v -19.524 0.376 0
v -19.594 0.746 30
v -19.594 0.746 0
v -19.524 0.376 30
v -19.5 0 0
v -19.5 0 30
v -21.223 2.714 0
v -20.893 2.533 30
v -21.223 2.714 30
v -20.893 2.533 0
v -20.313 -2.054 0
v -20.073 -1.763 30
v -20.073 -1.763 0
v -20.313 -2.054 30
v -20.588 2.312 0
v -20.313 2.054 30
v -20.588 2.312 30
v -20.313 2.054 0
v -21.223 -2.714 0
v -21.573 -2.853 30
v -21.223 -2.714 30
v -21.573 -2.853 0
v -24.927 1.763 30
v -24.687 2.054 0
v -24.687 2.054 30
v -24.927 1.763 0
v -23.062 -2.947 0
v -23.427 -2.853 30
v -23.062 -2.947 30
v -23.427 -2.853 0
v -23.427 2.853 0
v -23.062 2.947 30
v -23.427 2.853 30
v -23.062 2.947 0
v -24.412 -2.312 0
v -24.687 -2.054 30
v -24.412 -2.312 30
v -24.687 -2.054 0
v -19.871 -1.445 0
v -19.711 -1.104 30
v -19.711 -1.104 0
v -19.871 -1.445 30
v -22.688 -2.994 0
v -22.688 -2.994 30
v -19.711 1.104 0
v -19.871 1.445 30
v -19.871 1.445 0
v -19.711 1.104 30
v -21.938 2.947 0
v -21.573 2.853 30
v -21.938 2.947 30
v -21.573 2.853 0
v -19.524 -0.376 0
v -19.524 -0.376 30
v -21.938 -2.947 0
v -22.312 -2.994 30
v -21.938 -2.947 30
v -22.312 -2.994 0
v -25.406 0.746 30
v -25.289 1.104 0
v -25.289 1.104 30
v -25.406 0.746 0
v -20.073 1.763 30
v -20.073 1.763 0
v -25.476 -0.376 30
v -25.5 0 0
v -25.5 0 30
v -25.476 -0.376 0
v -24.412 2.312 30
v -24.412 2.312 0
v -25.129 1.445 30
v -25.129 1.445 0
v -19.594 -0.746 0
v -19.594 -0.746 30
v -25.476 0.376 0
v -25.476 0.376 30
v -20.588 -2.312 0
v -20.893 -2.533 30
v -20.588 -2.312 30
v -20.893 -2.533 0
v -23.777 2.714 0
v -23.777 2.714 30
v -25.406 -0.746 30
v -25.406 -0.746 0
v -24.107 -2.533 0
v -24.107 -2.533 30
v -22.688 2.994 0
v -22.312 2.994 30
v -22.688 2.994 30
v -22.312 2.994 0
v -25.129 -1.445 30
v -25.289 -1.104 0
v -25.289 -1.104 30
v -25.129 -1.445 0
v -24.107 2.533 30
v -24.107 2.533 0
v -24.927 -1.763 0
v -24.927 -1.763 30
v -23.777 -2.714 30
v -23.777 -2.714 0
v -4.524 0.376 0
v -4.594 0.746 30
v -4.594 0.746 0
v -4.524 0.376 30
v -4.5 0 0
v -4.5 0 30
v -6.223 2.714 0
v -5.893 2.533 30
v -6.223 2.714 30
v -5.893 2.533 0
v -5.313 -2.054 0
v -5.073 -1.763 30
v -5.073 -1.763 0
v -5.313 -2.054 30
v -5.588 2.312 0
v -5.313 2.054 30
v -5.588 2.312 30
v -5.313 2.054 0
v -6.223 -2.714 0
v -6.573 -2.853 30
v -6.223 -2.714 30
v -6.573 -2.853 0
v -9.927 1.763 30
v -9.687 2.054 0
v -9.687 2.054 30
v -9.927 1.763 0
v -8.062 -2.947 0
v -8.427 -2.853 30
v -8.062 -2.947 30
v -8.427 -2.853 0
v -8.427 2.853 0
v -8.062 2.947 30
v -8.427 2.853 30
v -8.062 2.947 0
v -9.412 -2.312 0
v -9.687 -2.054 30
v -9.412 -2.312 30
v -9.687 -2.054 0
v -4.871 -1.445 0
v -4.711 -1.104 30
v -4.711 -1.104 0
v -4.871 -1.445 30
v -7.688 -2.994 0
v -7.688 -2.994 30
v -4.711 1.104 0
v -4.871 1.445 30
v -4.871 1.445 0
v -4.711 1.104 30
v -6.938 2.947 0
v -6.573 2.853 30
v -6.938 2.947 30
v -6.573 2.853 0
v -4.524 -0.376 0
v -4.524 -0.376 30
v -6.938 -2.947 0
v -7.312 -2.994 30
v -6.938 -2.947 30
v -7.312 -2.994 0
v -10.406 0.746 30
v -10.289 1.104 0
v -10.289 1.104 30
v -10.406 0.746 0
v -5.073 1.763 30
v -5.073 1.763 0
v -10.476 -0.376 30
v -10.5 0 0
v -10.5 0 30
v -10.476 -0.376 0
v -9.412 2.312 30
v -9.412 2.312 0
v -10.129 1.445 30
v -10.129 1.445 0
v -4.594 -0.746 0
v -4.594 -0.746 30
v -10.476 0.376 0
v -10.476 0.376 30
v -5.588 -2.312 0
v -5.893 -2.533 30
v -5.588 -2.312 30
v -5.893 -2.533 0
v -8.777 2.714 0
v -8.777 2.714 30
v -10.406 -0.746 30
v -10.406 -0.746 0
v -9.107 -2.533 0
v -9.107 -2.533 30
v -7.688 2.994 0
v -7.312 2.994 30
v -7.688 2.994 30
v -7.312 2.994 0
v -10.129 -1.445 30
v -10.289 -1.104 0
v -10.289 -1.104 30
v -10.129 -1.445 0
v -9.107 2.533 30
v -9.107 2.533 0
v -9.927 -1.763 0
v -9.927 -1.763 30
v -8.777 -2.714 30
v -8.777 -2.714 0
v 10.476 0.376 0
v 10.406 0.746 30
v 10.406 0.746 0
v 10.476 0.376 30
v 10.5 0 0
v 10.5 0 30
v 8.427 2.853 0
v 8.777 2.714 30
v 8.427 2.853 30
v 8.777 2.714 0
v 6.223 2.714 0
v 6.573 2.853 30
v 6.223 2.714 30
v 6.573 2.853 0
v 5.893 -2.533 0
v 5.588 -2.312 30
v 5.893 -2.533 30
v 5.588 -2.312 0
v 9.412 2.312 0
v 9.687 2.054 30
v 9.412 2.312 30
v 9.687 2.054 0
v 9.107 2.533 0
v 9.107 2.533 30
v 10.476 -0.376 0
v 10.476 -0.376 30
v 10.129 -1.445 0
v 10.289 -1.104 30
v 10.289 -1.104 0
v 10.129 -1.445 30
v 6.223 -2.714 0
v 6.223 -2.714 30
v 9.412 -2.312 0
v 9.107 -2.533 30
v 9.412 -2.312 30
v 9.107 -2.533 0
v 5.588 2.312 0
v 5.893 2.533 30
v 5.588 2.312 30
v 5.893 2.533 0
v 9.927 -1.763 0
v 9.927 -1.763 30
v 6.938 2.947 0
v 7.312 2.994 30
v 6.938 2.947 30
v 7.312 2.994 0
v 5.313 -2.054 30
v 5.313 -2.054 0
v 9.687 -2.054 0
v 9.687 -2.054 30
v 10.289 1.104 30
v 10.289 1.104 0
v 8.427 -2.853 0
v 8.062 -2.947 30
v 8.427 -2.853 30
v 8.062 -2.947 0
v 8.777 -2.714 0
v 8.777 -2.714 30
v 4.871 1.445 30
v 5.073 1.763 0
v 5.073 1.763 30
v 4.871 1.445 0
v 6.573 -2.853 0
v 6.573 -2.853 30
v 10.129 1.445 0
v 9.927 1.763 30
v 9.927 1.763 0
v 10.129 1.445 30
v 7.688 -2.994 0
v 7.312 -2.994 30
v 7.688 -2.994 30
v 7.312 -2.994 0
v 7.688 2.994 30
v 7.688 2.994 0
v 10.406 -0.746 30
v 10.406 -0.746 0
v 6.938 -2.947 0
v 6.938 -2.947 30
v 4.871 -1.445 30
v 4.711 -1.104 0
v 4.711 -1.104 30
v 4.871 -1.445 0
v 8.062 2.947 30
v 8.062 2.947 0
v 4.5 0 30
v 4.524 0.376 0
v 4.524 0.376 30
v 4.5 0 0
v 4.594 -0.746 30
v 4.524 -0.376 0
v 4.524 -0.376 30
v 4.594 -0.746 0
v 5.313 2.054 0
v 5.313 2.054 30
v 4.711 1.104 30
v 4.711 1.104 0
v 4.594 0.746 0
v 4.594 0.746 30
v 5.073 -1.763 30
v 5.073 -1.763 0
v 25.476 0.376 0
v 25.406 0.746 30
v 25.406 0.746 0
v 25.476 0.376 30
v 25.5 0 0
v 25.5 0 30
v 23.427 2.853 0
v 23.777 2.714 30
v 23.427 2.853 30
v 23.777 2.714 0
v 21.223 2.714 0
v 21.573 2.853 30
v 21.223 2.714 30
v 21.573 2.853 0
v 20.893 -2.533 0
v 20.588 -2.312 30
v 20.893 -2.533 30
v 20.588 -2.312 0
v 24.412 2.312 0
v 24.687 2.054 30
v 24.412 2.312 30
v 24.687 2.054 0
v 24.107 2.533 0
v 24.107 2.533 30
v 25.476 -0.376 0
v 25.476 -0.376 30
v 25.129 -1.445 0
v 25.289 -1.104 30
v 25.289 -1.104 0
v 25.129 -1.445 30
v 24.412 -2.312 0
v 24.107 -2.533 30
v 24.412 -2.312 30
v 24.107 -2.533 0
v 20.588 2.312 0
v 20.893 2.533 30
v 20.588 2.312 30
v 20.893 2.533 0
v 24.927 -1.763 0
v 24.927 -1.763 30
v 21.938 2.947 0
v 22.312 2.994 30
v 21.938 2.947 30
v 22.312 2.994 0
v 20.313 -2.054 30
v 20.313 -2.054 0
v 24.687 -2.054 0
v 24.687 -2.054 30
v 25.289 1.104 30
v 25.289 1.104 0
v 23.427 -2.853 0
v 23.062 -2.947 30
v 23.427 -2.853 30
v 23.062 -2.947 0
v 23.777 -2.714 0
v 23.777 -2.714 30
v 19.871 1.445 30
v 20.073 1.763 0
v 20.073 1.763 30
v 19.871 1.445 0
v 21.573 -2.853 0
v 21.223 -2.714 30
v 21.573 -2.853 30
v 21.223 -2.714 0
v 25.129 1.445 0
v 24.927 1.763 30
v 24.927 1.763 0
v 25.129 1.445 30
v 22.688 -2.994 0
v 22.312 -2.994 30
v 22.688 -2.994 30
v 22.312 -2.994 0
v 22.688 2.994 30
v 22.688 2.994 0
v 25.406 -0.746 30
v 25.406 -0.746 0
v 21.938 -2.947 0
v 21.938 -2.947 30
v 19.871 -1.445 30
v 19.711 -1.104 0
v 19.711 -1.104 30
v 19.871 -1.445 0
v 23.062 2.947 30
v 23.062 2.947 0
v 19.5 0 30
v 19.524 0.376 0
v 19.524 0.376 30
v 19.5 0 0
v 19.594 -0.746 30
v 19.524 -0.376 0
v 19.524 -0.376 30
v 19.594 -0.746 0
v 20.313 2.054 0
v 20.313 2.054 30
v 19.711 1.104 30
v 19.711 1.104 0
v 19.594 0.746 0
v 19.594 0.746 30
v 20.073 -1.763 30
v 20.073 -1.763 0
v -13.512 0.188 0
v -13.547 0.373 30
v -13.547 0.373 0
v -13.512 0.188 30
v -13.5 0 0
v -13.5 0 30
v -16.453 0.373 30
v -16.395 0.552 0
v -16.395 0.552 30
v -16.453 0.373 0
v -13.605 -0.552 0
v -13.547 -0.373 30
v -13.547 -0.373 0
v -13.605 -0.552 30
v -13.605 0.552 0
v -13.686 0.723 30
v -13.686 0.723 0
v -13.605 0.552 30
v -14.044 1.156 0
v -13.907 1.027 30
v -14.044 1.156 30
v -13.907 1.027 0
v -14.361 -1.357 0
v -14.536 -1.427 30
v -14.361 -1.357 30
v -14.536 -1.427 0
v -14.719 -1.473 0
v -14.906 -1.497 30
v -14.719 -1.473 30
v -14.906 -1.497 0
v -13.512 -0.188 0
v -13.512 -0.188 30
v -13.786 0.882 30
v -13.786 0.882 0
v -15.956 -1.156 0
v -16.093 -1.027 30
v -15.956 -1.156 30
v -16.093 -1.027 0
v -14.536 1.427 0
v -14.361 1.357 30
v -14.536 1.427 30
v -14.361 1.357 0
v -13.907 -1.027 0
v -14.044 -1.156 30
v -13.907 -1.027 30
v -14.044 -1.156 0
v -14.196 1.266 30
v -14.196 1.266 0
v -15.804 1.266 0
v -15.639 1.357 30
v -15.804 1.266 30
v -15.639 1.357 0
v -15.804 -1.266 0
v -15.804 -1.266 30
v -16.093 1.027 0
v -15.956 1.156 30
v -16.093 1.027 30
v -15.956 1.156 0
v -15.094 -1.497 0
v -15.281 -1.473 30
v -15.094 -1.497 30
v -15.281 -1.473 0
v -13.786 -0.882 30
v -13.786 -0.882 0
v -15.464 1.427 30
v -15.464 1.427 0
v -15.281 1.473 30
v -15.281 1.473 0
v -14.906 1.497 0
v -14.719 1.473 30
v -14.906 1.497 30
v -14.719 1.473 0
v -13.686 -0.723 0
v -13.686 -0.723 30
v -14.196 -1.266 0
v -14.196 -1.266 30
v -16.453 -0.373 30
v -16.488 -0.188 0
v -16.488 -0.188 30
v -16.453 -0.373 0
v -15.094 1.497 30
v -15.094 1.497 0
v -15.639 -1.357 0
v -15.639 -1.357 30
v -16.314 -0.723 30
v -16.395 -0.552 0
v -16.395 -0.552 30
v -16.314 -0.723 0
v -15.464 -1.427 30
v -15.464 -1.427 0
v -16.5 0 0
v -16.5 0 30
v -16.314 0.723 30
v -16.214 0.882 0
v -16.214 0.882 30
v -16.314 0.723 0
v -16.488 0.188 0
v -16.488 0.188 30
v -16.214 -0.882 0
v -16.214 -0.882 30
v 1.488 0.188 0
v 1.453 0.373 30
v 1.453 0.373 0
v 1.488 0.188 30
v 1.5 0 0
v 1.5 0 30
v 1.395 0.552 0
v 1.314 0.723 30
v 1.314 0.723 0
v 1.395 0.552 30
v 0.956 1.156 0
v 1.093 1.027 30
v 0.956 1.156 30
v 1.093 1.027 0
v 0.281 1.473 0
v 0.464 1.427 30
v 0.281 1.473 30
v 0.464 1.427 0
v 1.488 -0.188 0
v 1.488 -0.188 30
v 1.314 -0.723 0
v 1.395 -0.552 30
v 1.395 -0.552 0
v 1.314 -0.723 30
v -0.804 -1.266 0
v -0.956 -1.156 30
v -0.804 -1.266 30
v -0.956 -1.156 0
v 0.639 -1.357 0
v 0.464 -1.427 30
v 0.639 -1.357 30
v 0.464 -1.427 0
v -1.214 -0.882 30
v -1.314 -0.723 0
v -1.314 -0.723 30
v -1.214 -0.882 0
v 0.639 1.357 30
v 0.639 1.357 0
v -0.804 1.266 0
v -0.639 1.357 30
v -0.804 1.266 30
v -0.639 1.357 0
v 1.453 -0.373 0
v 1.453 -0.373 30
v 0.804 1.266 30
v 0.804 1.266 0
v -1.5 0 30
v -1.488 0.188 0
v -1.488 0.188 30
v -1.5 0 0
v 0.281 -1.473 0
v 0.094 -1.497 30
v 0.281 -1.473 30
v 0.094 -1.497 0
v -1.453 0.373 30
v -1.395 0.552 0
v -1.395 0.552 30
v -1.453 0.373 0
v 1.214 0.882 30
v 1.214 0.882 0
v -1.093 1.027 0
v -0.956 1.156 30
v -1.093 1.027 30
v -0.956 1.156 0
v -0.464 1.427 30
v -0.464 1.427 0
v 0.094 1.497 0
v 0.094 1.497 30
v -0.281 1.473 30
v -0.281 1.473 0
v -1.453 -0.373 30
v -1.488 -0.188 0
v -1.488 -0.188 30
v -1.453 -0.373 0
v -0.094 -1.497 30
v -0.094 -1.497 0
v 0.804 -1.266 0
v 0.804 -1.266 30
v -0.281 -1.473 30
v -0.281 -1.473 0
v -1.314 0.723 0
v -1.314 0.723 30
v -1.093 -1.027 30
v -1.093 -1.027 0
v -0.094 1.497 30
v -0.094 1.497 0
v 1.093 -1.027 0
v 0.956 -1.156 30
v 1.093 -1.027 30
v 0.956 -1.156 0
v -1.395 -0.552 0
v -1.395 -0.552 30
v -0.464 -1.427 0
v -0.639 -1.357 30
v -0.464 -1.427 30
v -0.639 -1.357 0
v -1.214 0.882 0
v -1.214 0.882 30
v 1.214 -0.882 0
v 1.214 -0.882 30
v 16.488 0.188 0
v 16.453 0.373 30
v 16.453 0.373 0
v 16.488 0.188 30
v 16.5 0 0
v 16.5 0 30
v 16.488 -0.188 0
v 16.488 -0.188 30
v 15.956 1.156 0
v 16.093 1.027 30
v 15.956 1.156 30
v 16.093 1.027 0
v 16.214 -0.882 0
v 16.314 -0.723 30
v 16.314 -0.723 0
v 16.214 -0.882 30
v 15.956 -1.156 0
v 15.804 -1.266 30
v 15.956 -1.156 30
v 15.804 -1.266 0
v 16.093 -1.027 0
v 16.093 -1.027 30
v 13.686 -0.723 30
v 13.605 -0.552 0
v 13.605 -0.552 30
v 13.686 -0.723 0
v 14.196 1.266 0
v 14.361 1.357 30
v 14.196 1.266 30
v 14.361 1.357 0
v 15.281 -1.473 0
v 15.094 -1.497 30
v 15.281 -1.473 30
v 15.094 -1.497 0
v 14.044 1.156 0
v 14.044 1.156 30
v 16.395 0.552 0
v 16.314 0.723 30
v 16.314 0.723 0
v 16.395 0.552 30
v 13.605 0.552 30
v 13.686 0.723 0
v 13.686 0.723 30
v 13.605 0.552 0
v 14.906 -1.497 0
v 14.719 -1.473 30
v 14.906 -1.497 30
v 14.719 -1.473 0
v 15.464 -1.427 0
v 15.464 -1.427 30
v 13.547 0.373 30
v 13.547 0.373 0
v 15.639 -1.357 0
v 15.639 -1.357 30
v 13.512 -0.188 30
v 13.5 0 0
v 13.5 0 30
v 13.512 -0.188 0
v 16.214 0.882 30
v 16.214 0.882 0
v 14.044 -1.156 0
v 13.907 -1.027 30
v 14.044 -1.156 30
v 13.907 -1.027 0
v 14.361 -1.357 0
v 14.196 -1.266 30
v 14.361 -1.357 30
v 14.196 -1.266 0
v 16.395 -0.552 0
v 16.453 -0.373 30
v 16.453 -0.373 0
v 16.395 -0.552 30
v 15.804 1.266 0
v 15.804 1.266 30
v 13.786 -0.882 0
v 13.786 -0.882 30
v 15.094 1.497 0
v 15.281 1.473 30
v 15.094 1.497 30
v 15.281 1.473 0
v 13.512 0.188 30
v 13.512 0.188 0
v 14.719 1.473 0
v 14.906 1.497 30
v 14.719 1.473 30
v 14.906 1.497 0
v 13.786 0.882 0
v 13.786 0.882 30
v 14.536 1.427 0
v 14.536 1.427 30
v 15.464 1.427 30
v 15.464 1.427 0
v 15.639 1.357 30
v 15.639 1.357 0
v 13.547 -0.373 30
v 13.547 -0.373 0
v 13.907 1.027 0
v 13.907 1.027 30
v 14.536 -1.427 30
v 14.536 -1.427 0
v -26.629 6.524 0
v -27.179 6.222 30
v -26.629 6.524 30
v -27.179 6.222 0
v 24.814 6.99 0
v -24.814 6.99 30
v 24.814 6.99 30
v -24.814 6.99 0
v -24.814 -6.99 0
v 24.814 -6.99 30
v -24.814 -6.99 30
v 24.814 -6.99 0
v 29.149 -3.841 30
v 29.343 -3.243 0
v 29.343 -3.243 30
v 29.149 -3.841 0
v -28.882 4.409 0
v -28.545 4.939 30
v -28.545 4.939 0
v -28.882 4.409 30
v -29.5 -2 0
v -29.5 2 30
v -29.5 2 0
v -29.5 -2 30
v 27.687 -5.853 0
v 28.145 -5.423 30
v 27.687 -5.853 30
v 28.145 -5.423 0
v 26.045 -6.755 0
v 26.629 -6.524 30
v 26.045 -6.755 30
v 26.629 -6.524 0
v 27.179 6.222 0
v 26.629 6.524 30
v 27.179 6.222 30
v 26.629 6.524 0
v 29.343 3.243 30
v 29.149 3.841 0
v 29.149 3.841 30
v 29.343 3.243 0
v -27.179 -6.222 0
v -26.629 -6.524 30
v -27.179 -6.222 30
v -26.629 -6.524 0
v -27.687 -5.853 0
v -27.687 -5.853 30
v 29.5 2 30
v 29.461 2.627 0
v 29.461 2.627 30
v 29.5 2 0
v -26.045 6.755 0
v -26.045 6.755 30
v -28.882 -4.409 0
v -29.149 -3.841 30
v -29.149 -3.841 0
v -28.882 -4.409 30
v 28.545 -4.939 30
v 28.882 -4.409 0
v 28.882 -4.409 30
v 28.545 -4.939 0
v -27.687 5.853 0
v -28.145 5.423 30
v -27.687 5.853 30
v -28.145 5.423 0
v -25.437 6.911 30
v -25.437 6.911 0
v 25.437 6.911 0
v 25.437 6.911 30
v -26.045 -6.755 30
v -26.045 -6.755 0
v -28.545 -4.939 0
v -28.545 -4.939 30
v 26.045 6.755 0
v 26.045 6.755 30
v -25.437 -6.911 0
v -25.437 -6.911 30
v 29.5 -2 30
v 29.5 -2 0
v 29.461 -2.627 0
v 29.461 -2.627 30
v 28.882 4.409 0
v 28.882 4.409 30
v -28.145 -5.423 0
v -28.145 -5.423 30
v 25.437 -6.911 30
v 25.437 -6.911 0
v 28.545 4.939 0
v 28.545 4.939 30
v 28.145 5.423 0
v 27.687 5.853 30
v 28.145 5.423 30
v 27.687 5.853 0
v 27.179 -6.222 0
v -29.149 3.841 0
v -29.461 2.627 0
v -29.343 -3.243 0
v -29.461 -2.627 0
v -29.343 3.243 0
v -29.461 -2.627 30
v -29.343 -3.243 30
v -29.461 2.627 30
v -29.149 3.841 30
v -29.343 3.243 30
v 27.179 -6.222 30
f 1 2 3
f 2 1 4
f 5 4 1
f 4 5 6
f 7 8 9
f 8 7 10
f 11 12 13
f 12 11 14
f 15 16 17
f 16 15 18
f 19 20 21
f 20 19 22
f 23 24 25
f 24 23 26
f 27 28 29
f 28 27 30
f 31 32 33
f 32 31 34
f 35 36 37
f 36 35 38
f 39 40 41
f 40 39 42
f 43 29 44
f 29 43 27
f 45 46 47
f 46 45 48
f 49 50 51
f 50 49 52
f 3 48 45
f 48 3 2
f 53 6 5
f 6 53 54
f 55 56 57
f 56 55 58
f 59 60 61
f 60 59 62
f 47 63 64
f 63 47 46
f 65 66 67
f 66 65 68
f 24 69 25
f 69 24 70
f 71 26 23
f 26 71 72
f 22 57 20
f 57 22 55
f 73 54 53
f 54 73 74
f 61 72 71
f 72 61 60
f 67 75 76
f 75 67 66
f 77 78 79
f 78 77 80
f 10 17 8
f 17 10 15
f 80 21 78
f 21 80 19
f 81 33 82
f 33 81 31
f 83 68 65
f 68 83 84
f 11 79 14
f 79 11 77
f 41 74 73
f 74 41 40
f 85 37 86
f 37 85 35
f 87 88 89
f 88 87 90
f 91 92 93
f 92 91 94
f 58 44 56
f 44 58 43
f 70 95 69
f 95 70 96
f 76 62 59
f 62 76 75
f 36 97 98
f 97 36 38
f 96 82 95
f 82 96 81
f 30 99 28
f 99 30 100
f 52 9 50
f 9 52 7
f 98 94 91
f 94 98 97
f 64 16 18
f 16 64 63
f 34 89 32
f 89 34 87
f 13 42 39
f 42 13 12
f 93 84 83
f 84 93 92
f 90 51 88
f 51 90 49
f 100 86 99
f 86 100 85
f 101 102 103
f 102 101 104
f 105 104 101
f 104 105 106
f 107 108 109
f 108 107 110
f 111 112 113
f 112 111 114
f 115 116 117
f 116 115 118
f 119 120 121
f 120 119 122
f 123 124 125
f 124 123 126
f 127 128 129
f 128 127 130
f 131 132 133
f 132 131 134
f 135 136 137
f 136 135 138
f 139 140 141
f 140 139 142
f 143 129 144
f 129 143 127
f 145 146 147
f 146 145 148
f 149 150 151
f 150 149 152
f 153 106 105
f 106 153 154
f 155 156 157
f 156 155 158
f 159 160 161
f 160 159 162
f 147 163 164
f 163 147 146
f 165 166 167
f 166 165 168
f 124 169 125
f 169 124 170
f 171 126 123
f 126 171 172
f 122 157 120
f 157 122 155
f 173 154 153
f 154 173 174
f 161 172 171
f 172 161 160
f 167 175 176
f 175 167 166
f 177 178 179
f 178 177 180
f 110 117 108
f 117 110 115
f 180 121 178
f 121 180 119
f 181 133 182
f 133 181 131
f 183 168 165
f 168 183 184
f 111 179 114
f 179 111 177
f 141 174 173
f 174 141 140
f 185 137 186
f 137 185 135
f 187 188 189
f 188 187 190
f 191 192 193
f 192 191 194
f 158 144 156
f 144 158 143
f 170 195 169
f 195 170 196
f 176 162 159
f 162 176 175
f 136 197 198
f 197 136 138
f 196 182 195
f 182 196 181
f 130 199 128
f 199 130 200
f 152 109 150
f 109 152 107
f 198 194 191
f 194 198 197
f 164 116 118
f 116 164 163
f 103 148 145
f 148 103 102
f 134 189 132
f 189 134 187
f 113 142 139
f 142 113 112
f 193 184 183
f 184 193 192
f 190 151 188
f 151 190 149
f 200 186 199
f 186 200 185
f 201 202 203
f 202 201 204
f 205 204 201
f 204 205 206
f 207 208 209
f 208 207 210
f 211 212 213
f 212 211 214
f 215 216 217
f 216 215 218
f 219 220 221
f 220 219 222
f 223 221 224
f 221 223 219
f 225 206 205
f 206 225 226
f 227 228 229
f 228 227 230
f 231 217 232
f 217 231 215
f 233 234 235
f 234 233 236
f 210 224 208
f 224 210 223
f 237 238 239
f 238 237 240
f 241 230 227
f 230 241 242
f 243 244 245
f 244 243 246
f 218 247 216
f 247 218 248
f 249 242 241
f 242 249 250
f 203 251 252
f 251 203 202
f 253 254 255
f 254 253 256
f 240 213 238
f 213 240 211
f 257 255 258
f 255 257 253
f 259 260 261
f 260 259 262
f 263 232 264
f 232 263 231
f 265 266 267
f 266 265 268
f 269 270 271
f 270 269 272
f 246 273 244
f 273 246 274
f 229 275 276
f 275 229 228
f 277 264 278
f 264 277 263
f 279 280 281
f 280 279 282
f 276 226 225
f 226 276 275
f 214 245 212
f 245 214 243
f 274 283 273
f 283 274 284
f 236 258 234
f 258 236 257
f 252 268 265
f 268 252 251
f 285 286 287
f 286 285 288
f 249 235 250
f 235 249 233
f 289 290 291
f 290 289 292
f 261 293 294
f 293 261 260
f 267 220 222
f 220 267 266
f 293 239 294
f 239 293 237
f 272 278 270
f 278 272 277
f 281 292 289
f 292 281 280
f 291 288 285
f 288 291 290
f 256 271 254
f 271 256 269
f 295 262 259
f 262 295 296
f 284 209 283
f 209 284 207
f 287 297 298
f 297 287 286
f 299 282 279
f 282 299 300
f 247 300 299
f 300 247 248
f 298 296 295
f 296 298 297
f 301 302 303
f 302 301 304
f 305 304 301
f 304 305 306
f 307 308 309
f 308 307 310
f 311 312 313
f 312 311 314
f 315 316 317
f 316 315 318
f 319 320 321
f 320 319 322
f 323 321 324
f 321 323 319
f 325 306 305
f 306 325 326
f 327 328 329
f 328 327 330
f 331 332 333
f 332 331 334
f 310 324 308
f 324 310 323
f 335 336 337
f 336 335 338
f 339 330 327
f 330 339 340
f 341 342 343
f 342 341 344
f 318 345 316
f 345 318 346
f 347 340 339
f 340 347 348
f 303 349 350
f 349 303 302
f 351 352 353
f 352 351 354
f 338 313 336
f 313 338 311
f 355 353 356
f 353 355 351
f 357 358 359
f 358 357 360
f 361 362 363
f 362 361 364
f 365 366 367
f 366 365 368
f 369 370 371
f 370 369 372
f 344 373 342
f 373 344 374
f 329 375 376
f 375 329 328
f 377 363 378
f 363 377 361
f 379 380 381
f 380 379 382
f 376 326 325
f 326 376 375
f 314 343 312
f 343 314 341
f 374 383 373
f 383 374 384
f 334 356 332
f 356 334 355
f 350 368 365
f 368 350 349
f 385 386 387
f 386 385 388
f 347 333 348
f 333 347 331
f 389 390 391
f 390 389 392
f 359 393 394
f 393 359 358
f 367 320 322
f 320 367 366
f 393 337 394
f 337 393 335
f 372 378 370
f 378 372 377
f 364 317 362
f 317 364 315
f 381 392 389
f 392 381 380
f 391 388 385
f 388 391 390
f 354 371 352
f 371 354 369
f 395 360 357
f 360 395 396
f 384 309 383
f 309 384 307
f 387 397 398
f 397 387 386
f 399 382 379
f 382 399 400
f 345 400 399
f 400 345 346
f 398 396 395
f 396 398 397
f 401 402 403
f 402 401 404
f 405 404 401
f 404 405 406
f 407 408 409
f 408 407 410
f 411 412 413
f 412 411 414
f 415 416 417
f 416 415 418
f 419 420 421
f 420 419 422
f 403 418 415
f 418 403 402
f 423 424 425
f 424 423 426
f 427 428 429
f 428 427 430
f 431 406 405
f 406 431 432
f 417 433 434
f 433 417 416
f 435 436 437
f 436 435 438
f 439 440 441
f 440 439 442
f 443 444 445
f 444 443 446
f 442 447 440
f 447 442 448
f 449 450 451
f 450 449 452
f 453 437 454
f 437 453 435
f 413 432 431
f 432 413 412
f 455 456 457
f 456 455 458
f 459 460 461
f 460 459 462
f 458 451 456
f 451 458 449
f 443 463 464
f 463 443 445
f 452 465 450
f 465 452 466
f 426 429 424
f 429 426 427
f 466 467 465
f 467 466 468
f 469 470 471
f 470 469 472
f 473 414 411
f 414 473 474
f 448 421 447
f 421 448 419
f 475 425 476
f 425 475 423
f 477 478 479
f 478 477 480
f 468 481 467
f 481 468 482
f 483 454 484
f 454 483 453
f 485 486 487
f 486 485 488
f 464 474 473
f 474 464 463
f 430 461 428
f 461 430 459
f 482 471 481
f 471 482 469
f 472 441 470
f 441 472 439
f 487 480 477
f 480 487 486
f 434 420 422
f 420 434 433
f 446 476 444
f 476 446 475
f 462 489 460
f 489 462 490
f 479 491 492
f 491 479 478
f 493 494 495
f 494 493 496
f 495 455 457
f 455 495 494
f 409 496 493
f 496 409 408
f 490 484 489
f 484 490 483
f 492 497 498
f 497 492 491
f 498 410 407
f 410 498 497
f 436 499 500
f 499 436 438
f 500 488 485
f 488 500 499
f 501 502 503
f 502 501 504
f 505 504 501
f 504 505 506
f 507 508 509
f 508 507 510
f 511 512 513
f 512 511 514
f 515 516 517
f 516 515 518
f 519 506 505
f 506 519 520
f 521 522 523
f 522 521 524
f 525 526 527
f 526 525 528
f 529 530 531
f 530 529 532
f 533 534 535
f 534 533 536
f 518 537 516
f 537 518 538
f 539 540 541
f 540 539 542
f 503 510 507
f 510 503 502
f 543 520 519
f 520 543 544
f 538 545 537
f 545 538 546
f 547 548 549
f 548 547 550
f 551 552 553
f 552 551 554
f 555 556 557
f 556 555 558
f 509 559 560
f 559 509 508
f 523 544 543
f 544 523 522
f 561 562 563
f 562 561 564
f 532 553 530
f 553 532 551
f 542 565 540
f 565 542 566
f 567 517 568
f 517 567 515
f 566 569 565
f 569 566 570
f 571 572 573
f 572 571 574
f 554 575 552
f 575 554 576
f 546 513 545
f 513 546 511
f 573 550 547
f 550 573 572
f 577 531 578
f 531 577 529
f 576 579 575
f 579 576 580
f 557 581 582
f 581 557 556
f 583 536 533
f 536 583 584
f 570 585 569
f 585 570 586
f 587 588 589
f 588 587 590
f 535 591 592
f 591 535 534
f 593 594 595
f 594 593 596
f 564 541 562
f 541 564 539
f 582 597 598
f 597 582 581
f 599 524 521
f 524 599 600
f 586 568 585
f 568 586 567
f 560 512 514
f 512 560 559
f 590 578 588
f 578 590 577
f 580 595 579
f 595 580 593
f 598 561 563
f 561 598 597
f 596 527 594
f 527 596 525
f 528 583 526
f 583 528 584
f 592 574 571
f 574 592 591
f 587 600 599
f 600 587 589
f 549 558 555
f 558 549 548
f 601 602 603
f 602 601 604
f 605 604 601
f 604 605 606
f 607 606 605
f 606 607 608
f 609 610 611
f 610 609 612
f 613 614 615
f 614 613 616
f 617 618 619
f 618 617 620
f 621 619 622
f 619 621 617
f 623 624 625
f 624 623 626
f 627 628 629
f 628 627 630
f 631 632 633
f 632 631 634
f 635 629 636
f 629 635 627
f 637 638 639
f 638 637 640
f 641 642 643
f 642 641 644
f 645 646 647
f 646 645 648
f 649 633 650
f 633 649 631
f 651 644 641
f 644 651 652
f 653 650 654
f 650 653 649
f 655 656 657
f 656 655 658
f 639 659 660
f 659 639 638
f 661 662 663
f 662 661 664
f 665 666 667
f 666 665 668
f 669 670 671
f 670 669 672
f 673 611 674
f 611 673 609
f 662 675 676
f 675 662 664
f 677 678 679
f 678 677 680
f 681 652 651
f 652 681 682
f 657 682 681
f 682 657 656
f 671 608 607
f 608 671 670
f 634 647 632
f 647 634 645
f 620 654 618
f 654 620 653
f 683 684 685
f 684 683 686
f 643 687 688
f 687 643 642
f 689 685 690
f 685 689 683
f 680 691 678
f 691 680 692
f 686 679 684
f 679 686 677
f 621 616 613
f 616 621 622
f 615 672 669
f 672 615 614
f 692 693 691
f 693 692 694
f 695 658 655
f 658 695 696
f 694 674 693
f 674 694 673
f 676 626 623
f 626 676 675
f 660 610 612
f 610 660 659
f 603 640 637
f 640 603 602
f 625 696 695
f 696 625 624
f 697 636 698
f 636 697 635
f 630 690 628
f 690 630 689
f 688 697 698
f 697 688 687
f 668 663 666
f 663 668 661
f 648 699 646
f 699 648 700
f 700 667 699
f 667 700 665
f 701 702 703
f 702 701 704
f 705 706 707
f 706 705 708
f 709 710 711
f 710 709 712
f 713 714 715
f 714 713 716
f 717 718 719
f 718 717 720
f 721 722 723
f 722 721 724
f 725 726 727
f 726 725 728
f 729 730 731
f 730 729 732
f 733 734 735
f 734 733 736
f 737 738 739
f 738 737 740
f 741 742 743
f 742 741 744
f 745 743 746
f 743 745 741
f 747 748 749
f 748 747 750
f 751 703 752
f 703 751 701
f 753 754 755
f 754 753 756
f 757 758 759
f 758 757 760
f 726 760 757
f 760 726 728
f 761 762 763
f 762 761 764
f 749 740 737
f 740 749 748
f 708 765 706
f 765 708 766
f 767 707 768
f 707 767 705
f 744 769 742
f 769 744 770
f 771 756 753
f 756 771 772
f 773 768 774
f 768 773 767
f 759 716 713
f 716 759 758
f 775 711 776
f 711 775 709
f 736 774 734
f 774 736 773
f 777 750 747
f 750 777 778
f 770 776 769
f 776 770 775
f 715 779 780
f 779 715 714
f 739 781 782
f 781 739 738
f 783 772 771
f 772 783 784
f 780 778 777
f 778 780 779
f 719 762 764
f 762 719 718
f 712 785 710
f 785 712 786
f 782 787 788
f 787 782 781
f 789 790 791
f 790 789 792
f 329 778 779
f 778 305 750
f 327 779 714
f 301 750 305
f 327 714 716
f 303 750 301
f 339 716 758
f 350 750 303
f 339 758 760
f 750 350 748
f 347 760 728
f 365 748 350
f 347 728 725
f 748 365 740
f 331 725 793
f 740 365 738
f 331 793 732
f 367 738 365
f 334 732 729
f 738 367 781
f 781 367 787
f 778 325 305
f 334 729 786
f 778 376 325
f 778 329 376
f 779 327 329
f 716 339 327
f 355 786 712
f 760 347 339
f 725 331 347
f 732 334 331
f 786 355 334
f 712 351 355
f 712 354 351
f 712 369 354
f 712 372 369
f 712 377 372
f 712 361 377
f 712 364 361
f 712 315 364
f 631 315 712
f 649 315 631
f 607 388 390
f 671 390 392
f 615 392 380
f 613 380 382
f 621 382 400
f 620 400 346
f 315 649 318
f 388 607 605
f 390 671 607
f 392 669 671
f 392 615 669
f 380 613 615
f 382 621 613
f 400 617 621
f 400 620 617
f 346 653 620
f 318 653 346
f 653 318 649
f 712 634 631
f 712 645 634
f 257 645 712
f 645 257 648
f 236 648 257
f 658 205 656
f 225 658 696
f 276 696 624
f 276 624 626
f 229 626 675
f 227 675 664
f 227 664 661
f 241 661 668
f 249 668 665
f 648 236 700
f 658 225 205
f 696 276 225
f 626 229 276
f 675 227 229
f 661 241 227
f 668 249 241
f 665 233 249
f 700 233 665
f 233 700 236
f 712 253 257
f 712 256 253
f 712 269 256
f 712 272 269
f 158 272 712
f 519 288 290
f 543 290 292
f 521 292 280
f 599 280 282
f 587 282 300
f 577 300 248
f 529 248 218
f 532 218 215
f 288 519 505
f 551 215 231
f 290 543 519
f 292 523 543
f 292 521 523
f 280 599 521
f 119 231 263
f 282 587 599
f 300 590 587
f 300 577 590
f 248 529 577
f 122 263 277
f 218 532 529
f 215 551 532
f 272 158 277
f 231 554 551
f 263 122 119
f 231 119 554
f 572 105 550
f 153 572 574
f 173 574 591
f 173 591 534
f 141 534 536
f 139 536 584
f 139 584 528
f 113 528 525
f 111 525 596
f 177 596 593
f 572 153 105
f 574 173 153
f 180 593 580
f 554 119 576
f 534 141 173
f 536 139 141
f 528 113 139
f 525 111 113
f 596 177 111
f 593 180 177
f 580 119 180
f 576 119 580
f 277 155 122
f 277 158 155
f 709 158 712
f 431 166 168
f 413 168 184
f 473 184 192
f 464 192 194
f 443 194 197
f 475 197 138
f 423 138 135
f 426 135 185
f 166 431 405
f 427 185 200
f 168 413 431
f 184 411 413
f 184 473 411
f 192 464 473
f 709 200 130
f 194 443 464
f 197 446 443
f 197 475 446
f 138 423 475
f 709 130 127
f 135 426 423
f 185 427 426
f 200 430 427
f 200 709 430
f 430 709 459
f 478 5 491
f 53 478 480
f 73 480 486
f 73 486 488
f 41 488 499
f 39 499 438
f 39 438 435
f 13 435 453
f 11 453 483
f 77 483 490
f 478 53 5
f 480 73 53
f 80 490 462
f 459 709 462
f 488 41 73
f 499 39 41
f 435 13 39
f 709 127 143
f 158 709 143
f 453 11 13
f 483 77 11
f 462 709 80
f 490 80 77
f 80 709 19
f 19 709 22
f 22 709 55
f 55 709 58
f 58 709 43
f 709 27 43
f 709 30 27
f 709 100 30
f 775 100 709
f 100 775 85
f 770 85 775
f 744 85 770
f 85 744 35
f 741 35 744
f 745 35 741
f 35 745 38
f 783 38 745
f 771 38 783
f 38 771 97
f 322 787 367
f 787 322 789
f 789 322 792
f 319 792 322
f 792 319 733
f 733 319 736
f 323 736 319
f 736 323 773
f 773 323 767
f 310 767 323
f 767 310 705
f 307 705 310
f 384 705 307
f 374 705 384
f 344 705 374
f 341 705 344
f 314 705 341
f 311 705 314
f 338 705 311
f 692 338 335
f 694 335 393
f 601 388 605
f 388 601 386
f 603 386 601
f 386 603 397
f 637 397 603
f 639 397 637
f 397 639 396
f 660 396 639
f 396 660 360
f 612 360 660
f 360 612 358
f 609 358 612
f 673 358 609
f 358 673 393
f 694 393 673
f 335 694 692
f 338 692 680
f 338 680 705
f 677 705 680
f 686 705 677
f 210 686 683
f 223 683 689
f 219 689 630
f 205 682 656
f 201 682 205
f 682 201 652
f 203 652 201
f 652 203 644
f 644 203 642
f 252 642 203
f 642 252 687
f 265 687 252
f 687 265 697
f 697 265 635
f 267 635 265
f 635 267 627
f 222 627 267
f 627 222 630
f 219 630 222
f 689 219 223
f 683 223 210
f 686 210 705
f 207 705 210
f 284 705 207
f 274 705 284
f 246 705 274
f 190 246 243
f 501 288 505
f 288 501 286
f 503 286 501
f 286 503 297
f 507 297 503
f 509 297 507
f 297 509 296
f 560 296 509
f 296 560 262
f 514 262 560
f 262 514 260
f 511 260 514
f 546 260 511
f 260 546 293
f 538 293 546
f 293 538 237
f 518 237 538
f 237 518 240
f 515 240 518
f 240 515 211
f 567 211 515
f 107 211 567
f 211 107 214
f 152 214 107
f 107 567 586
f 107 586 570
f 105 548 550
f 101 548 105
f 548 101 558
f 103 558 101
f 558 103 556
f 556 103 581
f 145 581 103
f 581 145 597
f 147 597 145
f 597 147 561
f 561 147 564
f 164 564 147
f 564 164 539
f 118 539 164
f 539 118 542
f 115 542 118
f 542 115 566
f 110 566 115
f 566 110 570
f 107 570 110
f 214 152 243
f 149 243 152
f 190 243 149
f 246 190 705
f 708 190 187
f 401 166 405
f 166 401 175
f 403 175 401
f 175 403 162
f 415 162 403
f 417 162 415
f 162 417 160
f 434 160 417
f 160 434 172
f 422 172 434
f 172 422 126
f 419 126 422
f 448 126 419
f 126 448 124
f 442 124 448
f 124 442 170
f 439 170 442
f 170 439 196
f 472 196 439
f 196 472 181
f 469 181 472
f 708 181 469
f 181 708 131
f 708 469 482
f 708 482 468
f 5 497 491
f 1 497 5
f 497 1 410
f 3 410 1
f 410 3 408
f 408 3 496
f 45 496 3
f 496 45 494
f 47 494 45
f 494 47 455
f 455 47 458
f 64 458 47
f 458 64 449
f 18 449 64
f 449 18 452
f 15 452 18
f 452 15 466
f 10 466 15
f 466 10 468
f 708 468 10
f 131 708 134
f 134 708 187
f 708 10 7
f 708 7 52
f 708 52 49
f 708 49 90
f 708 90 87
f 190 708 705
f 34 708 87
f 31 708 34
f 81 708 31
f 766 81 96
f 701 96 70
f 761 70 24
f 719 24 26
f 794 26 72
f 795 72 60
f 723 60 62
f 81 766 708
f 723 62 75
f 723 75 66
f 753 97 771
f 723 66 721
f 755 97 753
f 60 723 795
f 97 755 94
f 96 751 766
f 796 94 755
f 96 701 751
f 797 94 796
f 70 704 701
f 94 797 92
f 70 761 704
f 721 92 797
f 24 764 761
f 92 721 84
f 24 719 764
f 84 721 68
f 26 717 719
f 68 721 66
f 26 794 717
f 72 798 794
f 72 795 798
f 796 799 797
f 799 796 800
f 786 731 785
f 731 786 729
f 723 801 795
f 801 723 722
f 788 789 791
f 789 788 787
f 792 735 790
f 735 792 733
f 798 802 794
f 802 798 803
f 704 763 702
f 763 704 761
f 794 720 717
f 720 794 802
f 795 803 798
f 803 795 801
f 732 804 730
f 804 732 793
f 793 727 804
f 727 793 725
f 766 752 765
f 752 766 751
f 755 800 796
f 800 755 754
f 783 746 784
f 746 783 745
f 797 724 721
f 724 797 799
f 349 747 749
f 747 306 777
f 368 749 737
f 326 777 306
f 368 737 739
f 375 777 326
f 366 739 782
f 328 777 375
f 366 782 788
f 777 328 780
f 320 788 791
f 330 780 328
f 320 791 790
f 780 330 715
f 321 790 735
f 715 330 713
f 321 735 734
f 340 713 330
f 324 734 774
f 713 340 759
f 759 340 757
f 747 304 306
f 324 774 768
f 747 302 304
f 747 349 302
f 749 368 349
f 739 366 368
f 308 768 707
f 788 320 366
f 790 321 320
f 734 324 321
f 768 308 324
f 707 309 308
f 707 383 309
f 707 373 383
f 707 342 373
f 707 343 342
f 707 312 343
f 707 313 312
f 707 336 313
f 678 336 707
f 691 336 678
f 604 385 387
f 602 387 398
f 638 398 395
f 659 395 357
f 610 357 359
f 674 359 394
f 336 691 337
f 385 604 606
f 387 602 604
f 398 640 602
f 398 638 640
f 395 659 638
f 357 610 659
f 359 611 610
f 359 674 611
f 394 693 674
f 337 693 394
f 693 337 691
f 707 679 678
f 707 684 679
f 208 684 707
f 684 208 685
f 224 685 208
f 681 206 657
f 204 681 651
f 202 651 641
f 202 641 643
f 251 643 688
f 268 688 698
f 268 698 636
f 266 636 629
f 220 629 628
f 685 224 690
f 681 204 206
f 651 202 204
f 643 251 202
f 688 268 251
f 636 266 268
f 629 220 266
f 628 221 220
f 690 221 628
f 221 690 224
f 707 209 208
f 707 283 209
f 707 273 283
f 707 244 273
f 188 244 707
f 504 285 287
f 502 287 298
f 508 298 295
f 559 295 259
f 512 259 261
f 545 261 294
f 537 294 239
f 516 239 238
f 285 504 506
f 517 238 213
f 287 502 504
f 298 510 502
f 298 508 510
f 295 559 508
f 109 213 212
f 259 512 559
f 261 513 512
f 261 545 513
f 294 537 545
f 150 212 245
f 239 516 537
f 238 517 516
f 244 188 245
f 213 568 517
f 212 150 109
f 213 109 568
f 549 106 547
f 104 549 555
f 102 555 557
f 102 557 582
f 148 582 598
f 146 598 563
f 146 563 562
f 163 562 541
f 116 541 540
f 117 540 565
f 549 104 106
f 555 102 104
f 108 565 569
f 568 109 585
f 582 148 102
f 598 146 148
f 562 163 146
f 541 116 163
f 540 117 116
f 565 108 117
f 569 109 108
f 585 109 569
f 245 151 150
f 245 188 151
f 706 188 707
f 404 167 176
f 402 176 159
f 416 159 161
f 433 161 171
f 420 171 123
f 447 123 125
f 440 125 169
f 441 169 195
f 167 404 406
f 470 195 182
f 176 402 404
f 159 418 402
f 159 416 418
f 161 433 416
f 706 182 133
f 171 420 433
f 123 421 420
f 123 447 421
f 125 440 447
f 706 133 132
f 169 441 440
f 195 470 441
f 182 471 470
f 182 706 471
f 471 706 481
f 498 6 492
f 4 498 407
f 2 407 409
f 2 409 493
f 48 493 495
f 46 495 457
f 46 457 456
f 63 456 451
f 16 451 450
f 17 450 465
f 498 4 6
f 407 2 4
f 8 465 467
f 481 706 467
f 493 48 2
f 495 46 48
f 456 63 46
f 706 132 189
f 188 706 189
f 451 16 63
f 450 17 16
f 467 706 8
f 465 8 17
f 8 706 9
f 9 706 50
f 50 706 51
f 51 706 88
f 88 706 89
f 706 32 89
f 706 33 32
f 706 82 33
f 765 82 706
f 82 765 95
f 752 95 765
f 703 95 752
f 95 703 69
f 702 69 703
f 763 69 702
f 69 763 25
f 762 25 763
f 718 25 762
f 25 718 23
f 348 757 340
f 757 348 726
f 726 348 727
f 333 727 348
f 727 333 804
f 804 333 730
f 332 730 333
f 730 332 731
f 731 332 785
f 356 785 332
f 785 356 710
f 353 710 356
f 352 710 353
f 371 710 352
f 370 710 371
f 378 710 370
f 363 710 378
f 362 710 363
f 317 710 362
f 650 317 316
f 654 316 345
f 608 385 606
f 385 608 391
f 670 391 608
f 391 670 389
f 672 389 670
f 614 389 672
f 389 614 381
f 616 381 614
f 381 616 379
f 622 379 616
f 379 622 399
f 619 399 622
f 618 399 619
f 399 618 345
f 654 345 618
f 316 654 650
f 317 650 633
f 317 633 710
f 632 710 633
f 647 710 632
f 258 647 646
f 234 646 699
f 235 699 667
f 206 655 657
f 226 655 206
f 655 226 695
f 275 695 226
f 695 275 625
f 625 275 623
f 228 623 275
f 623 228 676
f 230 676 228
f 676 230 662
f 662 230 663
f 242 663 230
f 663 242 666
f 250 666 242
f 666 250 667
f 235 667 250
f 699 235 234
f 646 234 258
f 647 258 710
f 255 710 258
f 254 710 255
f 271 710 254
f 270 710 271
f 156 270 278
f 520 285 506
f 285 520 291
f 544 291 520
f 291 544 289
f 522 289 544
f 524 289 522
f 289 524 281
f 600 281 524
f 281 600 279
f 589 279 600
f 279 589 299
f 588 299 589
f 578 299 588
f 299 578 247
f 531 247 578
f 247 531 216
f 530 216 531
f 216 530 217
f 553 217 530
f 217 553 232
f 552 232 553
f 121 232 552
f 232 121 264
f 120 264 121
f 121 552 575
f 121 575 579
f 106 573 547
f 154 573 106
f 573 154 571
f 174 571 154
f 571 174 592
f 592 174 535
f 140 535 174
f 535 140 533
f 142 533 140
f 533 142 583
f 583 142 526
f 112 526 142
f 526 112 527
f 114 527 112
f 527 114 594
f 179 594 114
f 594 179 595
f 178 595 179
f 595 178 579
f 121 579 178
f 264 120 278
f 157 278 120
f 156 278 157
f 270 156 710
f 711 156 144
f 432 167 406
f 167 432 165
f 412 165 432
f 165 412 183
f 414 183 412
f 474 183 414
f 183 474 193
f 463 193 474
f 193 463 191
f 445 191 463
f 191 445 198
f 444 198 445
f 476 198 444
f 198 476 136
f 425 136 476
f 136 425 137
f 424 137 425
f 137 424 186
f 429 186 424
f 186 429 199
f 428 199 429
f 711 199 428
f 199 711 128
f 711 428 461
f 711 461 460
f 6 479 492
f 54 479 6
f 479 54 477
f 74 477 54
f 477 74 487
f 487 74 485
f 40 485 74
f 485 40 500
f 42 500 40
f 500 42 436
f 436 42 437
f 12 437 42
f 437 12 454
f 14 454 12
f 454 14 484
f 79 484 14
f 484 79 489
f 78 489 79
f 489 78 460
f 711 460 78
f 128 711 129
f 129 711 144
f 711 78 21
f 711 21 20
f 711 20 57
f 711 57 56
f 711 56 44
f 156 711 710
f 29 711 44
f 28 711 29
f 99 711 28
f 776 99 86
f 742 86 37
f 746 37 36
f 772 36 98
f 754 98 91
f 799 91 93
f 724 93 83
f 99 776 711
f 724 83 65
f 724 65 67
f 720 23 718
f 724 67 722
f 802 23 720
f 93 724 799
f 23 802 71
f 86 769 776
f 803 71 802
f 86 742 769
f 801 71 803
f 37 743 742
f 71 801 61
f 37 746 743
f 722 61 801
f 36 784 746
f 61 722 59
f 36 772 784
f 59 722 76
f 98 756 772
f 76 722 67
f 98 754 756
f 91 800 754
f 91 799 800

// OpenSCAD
$fn = 50;


difference() {
	union() {
		hull() {
			translate(v = [-24.5000000000, 2.0000000000, 0]) {
				cylinder(h = 30, r = 5);
			}
			translate(v = [24.5000000000, 2.0000000000, 0]) {
				cylinder(h = 30, r = 5);
			}
			translate(v = [-24.5000000000, -2.0000000000, 0]) {
				cylinder(h = 30, r = 5);
			}
			translate(v = [24.5000000000, -2.0000000000, 0]) {
				cylinder(h = 30, r = 5);
			}
		}
	}
	union() {
		translate(v = [-22.5000000000, 0.0000000000, 0]) {
			translate(v = [0, 0, -100]) {
				cylinder(h = 200, r = 3.0000000000);
			}
		}
		translate(v = [-7.5000000000, 0.0000000000, 0]) {
			translate(v = [0, 0, -100]) {
				cylinder(h = 200, r = 3.0000000000);
			}
		}
		translate(v = [7.5000000000, 0.0000000000, 0]) {
			translate(v = [0, 0, -100]) {
				cylinder(h = 200, r = 3.0000000000);
			}
		}
		translate(v = [22.5000000000, 0.0000000000, 0]) {
			translate(v = [0, 0, -100]) {
				cylinder(h = 200, r = 3.0000000000);
			}
		}
		translate(v = [-22.5000000000, 0.0000000000, 0]) {
			translate(v = [0, 0, -100]) {
				cylinder(h = 200, r = 1.5000000000);
			}
		}
		translate(v = [-15.0000000000, 0.0000000000, 0]) {
			translate(v = [0, 0, -100]) {
				cylinder(h = 200, r = 1.5000000000);
			}
		}
		translate(v = [-7.5000000000, 0.0000000000, 0]) {
			translate(v = [0, 0, -100]) {
				cylinder(h = 200, r = 1.5000000000);
			}
		}
		translate(v = [0, 0, -100]) {
			cylinder(h = 200, r = 1.5000000000);
		}
		translate(v = [7.5000000000, 0.0000000000, 0]) {
			translate(v = [0, 0, -100]) {
				cylinder(h = 200, r = 1.5000000000);
			}
		}
		translate(v = [15.0000000000, 0.0000000000, 0]) {
			translate(v = [0, 0, -100]) {
				cylinder(h = 200, r = 1.5000000000);
			}
		}
		translate(v = [22.5000000000, 0.0000000000, 0]) {
			translate(v = [0, 0, -100]) {
				cylinder(h = 200, r = 1.5000000000);
			}
		}
	}
}
